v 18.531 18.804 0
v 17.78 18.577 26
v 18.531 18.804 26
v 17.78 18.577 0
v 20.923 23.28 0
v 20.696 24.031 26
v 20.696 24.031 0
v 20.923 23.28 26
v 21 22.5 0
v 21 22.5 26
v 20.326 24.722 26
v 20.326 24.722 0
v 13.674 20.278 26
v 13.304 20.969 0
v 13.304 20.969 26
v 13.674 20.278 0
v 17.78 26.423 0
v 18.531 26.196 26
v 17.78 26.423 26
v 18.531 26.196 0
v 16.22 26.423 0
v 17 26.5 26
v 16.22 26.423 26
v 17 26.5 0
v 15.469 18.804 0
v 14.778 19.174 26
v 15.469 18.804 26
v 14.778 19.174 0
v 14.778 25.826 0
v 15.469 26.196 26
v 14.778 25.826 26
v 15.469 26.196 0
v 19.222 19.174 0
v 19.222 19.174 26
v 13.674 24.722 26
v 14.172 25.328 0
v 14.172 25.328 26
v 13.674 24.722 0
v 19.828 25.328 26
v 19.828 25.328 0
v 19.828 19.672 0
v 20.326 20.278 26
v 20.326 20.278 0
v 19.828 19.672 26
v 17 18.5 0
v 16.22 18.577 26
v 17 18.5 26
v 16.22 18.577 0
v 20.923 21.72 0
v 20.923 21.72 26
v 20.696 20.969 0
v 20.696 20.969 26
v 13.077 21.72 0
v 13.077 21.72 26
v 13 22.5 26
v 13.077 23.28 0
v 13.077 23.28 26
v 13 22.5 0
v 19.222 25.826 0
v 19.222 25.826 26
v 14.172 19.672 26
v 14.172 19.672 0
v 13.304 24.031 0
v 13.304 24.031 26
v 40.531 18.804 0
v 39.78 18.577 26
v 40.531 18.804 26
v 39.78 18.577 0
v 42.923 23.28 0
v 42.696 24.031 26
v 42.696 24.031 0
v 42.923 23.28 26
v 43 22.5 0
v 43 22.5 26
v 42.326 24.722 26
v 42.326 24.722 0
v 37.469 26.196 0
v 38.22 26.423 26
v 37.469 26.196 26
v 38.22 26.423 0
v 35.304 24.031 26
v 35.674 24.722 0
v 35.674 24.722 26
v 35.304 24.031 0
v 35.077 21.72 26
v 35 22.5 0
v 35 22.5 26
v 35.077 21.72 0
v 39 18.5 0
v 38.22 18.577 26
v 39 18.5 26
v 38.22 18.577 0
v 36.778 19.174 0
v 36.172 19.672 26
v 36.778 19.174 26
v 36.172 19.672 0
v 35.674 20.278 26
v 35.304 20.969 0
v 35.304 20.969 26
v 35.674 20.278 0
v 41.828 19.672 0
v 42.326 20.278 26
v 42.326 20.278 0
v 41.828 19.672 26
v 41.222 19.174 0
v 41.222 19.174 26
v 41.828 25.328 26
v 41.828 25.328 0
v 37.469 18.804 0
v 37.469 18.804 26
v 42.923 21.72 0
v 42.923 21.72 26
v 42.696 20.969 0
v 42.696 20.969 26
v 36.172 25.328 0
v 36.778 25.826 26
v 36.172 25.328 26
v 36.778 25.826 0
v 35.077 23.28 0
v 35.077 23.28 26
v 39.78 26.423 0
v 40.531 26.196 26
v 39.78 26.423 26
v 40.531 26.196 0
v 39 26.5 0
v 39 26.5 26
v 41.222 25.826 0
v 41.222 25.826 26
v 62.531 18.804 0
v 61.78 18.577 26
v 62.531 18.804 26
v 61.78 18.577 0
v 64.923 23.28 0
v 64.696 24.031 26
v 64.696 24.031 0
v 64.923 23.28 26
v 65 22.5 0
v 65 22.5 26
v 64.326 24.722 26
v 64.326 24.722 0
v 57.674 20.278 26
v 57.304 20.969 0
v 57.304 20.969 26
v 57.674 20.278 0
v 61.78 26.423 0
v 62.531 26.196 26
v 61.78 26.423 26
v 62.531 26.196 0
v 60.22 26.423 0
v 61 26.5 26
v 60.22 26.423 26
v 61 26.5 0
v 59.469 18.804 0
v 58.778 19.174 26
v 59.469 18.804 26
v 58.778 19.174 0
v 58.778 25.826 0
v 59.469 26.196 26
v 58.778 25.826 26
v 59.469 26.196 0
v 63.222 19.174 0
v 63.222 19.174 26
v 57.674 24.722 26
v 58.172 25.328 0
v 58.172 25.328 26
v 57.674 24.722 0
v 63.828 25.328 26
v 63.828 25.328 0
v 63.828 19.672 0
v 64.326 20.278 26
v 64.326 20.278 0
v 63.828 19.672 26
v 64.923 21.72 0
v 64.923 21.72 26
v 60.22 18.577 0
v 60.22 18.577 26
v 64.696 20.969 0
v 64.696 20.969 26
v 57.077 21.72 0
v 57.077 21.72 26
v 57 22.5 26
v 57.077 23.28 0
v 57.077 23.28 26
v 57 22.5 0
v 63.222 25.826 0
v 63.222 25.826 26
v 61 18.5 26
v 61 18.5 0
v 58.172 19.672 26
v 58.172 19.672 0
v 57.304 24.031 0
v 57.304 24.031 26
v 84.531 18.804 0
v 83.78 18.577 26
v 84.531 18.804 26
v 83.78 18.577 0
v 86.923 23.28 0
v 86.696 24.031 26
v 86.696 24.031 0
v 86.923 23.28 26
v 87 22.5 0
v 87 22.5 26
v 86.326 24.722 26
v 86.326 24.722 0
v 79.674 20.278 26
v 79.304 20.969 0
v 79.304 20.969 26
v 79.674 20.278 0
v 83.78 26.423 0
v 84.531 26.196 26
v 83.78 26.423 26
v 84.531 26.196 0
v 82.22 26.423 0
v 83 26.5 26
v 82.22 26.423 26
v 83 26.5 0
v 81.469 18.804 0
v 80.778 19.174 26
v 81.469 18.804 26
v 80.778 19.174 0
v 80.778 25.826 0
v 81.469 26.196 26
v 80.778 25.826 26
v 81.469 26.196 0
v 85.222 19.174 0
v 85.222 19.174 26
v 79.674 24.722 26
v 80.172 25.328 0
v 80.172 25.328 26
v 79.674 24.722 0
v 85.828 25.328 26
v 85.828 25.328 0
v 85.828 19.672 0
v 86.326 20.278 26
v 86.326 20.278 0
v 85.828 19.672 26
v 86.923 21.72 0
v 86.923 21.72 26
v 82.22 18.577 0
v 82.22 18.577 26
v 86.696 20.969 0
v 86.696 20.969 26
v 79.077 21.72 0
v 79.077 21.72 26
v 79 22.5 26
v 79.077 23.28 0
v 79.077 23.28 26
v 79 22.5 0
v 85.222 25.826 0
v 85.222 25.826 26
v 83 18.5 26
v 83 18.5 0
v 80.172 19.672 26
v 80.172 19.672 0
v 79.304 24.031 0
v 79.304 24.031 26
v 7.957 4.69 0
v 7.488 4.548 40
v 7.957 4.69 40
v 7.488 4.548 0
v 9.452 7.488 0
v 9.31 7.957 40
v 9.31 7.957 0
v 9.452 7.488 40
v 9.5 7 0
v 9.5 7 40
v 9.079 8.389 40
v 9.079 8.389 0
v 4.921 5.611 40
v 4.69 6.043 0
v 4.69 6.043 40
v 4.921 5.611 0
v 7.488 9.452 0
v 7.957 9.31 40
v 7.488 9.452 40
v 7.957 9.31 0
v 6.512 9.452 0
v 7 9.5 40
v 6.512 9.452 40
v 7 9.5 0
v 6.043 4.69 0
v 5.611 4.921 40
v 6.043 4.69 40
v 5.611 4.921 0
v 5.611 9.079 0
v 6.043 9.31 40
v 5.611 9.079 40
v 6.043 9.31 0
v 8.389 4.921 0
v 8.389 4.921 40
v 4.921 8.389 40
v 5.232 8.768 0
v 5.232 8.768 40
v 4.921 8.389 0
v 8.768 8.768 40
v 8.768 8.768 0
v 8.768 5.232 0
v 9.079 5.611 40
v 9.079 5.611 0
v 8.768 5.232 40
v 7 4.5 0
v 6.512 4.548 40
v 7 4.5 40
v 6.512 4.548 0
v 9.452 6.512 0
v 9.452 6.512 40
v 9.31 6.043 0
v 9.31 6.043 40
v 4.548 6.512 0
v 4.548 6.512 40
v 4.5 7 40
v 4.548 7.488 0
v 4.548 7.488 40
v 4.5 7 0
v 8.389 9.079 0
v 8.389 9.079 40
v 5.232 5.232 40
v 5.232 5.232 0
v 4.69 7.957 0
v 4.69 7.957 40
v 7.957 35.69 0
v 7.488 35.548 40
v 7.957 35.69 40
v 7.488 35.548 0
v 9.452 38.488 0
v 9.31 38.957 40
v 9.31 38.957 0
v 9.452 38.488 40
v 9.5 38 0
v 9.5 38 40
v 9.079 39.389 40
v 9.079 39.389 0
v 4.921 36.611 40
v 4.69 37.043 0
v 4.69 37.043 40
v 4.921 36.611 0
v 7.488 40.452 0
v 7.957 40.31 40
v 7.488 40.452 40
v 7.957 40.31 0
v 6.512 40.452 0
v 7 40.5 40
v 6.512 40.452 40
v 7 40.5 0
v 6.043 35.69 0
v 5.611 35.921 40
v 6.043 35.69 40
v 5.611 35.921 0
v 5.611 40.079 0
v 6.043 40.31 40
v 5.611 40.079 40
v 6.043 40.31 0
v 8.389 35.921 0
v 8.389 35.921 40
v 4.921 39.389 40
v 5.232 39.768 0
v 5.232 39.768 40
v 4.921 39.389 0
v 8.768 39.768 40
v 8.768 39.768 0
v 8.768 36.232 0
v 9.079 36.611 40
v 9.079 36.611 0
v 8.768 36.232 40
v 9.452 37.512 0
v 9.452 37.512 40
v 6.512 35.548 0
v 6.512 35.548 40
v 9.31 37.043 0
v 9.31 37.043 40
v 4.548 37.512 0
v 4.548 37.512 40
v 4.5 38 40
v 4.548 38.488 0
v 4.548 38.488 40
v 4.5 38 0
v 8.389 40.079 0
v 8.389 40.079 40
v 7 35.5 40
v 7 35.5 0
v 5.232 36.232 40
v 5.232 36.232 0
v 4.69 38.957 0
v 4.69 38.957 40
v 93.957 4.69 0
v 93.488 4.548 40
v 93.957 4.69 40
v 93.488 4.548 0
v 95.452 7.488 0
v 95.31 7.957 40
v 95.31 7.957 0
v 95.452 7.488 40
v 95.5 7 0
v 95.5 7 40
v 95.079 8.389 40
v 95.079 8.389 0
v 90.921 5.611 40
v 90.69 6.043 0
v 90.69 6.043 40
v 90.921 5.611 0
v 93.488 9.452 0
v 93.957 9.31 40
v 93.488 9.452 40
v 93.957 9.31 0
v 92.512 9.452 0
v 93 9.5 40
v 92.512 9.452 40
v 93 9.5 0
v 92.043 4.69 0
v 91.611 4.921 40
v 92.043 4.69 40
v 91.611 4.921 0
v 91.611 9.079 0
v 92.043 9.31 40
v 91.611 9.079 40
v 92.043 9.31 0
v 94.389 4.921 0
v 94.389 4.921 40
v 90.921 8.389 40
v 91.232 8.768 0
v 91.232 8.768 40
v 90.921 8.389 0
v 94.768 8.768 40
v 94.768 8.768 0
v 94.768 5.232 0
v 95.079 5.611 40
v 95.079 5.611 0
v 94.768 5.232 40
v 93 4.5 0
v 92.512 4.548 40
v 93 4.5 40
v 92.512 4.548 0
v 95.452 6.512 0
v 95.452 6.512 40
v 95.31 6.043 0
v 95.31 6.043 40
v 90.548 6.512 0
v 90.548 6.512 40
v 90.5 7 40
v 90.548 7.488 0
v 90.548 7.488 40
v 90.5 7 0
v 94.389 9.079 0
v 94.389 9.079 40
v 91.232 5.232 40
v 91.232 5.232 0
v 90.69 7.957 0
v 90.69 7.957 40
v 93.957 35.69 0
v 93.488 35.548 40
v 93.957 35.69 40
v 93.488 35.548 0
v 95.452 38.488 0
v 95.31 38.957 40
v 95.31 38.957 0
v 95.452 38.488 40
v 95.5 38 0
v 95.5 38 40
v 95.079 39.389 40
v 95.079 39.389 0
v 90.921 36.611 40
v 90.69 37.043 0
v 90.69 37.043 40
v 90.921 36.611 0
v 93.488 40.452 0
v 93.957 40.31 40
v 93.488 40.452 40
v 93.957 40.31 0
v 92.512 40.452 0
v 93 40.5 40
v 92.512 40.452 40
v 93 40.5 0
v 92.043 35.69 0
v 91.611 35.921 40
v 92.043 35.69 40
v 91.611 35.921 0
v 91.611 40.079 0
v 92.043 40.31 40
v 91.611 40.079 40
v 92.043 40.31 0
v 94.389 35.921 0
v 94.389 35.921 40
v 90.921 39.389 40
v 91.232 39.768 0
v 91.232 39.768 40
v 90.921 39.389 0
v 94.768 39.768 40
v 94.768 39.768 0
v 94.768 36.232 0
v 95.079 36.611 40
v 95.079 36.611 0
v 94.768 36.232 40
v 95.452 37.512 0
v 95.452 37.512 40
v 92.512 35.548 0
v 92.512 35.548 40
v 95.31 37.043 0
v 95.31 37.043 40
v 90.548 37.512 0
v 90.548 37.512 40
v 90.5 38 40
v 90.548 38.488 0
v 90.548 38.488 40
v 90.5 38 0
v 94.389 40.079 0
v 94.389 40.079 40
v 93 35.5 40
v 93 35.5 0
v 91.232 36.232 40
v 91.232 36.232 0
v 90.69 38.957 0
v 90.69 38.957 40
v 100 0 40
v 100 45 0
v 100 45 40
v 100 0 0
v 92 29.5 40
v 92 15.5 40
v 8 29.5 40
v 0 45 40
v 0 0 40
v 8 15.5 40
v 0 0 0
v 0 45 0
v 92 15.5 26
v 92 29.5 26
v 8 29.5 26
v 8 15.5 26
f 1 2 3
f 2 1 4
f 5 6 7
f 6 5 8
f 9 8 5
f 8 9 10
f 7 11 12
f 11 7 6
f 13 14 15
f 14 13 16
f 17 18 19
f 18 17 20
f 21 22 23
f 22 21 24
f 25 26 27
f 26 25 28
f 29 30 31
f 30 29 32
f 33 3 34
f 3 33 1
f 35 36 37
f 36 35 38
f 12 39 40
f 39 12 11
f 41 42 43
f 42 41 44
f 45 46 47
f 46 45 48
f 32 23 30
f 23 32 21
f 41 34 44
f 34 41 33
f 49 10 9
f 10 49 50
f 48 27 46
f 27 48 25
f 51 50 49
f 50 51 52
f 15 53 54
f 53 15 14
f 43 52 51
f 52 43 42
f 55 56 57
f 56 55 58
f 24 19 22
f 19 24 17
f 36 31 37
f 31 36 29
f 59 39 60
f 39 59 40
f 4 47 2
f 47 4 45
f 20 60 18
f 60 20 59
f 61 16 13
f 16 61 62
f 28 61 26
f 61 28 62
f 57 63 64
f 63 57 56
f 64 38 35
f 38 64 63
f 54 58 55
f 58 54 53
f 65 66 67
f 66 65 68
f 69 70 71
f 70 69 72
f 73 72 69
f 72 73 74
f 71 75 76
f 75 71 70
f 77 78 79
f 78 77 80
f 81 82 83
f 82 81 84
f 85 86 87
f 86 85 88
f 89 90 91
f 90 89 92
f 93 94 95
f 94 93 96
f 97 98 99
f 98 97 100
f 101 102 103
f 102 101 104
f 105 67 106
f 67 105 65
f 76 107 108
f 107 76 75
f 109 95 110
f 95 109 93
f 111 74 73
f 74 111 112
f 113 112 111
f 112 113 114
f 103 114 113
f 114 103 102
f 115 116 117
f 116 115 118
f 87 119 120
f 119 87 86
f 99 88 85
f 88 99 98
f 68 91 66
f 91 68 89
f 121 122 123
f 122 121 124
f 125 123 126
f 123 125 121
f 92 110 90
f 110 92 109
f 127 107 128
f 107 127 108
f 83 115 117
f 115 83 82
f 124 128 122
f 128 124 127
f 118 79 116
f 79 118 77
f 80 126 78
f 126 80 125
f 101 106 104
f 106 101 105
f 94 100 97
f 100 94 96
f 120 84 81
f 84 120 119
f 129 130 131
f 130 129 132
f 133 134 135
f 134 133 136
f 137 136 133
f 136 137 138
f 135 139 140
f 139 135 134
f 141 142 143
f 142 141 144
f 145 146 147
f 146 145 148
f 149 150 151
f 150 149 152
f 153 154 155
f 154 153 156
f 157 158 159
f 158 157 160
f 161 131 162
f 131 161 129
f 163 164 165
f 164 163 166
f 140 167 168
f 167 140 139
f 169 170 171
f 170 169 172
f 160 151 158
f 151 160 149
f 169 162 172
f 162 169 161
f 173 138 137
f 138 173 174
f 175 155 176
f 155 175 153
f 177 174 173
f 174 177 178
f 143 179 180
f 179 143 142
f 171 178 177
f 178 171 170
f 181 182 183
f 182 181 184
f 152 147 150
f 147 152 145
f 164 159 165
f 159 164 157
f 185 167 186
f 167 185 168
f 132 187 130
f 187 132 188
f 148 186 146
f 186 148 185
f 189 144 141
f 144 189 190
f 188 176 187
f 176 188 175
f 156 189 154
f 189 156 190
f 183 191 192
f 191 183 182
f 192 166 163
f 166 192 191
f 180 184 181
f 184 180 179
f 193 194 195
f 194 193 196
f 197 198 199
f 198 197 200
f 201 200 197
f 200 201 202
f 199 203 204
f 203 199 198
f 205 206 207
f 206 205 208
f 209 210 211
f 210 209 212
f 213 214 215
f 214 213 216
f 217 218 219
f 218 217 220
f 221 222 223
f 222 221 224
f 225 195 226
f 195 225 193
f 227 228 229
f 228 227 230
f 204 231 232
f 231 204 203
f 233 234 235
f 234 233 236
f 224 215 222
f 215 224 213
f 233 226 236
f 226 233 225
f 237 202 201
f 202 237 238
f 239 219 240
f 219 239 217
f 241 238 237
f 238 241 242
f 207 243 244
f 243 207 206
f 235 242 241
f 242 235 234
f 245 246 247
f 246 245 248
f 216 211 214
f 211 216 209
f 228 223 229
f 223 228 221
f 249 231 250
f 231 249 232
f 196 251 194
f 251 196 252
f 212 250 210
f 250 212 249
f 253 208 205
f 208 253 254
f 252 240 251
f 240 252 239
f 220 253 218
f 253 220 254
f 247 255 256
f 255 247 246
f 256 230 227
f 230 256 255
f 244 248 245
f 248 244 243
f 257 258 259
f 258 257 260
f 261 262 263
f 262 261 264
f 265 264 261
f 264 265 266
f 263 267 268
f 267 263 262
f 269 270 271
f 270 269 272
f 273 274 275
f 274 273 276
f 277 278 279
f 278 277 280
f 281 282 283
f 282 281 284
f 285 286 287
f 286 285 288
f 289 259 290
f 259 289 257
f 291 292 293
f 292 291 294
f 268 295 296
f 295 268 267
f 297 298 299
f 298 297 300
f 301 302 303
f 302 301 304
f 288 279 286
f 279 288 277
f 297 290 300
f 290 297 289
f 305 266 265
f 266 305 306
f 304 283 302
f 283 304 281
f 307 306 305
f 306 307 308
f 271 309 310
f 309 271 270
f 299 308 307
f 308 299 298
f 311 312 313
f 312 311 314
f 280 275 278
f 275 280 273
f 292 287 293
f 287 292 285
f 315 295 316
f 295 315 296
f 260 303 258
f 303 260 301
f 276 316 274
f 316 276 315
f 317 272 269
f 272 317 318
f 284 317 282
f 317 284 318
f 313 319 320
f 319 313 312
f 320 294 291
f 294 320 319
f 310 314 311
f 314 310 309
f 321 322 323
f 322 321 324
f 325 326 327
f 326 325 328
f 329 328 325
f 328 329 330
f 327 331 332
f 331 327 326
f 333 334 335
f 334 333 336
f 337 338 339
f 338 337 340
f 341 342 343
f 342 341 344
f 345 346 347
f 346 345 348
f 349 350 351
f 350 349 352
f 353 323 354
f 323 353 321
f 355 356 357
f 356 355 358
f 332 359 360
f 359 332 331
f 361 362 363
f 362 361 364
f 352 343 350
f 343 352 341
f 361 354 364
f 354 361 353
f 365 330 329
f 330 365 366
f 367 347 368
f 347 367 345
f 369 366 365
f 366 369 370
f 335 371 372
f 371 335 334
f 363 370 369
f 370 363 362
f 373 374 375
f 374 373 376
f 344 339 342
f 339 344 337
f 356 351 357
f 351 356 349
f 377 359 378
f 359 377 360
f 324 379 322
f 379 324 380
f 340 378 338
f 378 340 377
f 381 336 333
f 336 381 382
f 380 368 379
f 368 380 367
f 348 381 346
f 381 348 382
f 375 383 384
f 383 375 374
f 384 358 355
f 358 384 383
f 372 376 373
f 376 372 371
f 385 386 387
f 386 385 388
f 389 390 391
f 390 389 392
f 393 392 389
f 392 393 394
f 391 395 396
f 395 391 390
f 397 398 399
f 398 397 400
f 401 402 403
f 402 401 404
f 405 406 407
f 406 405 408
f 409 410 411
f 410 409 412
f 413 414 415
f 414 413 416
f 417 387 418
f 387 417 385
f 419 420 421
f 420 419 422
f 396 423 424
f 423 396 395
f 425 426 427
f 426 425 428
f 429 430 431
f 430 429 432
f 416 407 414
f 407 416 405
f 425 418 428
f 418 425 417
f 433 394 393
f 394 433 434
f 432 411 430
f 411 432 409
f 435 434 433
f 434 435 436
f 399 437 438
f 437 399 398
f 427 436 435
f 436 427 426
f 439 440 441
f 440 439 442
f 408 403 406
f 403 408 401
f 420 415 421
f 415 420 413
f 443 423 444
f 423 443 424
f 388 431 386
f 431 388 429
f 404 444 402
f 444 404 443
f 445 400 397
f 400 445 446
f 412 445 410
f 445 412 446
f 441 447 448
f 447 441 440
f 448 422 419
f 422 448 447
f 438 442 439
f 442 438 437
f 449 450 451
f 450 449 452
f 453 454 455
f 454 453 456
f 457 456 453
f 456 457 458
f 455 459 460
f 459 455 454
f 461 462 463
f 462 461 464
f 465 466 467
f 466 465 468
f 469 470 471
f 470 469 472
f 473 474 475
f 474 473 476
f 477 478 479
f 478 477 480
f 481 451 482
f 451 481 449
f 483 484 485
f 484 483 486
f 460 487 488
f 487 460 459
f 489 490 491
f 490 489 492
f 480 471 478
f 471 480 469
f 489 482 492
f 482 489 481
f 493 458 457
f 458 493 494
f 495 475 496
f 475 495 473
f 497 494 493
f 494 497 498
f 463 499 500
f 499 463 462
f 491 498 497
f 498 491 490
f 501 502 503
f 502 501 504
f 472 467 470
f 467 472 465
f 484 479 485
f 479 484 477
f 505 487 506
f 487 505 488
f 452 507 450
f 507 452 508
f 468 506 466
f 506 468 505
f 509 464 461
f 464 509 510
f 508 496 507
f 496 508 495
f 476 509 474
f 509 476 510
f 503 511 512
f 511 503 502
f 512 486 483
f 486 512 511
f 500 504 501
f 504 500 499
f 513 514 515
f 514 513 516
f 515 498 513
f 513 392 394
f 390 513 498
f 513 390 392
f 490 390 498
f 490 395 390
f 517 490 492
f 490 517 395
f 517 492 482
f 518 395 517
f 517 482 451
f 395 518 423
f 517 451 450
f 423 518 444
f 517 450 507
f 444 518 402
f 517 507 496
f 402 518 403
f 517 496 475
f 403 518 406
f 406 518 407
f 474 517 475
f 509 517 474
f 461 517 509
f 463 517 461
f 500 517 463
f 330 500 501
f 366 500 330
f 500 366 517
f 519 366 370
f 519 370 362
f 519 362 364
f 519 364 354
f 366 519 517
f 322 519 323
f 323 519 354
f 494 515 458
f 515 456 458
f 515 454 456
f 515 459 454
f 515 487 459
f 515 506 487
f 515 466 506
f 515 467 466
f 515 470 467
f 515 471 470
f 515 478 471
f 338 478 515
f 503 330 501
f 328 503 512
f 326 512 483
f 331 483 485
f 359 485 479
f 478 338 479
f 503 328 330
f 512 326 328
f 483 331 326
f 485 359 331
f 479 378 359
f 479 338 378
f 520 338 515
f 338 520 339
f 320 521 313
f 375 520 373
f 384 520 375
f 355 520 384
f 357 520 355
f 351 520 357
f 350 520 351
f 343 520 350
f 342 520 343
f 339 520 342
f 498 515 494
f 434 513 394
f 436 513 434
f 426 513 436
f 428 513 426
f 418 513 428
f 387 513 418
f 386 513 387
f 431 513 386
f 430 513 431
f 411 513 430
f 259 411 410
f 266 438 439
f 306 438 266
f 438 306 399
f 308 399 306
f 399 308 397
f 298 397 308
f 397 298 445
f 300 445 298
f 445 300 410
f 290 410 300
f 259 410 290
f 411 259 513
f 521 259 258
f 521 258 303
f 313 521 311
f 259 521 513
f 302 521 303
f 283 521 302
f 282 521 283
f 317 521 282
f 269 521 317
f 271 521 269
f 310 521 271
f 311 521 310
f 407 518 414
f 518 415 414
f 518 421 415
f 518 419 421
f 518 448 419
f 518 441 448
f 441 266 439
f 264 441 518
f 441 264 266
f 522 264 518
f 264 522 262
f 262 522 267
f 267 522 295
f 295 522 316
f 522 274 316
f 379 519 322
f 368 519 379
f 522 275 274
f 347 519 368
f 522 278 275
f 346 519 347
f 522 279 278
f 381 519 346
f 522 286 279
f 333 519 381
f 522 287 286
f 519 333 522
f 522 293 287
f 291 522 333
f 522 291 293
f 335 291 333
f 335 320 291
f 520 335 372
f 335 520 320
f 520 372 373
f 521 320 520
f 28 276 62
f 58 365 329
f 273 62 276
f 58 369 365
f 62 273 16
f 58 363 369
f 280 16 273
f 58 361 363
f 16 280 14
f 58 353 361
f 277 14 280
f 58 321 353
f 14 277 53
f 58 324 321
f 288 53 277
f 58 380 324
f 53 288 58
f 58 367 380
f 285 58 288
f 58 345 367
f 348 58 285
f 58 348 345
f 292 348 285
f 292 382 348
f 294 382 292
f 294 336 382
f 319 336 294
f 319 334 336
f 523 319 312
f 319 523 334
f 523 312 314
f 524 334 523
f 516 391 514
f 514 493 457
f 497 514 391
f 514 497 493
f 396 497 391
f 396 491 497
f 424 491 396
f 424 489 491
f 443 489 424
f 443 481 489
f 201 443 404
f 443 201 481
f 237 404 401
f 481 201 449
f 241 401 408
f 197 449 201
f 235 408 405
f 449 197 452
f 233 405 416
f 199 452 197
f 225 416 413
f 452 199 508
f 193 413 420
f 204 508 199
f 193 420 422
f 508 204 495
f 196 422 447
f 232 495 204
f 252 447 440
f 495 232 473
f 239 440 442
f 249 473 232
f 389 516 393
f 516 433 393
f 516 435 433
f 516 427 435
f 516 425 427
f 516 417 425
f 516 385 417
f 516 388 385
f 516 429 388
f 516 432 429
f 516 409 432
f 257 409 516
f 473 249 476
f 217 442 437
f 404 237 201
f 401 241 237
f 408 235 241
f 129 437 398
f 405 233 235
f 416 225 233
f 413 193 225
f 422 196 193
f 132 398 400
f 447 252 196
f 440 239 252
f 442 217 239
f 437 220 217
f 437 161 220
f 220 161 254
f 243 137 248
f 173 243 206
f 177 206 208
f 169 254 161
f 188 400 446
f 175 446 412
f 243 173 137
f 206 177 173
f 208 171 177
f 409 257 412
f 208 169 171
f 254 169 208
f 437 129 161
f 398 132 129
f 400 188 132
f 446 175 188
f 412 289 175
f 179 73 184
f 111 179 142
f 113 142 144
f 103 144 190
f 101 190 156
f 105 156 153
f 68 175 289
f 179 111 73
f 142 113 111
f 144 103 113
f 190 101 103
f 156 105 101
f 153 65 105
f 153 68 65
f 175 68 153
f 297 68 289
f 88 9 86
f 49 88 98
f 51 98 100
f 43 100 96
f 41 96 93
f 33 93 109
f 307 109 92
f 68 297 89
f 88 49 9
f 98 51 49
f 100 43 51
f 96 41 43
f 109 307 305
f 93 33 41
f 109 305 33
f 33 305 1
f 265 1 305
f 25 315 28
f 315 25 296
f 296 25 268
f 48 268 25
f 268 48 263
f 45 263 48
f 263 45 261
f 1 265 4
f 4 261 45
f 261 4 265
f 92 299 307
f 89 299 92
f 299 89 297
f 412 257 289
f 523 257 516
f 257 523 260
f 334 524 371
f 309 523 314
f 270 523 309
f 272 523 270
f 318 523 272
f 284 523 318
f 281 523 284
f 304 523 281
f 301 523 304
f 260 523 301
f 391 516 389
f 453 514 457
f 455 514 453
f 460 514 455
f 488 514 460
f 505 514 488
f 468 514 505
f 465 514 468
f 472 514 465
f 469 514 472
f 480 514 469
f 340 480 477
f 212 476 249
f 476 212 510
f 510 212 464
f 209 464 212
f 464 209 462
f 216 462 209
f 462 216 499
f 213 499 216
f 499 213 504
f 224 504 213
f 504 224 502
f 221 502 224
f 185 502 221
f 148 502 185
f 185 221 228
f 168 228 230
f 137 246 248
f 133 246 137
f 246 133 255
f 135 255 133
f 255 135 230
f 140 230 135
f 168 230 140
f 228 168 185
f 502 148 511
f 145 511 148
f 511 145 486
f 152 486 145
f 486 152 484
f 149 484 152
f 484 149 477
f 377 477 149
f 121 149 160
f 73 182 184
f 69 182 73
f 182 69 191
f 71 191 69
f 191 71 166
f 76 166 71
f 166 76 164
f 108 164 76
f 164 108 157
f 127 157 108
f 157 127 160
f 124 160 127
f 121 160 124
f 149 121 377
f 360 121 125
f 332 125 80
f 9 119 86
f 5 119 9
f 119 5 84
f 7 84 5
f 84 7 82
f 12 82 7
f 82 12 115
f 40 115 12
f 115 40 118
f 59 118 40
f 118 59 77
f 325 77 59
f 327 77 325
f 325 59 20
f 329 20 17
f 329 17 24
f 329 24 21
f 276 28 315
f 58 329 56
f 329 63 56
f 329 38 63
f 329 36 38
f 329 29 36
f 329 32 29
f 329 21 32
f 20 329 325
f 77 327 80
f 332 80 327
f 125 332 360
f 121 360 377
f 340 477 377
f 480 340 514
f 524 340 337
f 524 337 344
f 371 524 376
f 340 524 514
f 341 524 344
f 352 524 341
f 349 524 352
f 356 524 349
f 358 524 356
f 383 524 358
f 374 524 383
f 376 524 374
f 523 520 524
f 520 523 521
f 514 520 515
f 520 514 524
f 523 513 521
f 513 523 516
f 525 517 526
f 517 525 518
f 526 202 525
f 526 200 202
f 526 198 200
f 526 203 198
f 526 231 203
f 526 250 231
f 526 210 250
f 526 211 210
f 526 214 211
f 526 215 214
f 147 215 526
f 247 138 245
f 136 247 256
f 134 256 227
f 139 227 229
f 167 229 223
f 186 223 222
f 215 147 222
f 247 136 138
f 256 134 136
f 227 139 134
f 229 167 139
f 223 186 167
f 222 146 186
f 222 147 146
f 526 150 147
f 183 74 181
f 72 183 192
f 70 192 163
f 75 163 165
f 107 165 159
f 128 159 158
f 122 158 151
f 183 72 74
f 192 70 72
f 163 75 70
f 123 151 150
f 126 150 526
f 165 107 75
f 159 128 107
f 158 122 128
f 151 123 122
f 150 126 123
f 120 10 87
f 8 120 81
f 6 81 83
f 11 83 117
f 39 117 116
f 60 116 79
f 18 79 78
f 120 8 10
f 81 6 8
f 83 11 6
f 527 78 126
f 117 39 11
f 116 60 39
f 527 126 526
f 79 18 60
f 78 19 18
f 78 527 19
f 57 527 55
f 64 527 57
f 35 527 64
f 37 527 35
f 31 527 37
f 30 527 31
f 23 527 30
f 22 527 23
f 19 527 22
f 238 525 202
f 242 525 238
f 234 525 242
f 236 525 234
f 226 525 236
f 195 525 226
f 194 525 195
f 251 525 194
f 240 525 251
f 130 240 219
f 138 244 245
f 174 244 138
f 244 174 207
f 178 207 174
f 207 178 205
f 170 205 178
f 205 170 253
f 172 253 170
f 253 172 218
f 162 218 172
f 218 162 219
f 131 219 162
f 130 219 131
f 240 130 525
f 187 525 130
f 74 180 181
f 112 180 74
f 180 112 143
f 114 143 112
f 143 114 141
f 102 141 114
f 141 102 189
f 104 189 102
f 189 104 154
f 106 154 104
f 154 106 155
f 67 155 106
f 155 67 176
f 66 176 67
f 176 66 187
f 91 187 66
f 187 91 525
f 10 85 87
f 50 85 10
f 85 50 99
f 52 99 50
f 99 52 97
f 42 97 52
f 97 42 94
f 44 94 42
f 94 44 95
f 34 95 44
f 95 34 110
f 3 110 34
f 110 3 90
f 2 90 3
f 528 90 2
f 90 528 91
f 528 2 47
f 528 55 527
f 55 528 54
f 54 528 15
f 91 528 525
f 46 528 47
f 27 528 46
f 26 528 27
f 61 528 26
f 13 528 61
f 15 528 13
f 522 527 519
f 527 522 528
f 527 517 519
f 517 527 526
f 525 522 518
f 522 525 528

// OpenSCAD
$fn = 32;

// ----------------------------------------------------------------------
// Manifold block: gallery_top manifold
// ----------------------------------------------------------------------

// --- parameters (mm) ---
block_l = 100;            // block length, X
block_w = 45;             // block width, Y
block_h = 40;             // block height, Z
port_d = 8;               // port bore diameter
port_pitch = 22;          // port pitch along X
gallery_d = 14;           // top gallery width, Y
gallery_depth = 14;       // gallery pocket depth
wall_p = 8;               // gallery end wall thickness, X
mnt_d = 5;                // mounting hole diameter
mnt_in = 7;               // mounting hole inset from the edges

n_ports = 4;  // ports in the row
port_x0 = (block_l - (n_ports - 1) * port_pitch) / 2;  // first port X

difference() {
  cube([block_l, block_w, block_h]);
  for (i = [0 : n_ports - 1])
    translate([port_x0 + i * port_pitch, block_w / 2, -1])
      cylinder(h = block_h + 2, d = port_d);
  translate([wall_p, block_w / 2 - gallery_d / 2, block_h - gallery_depth])
    cube([block_l - 2 * wall_p, gallery_d, gallery_depth + 1]);
  for (cx = [mnt_in, block_l - mnt_in])
    for (cy = [mnt_in, block_w - mnt_in])
      translate([cx, cy, -1]) cylinder(h = block_h + 2, d = mnt_d);
}
